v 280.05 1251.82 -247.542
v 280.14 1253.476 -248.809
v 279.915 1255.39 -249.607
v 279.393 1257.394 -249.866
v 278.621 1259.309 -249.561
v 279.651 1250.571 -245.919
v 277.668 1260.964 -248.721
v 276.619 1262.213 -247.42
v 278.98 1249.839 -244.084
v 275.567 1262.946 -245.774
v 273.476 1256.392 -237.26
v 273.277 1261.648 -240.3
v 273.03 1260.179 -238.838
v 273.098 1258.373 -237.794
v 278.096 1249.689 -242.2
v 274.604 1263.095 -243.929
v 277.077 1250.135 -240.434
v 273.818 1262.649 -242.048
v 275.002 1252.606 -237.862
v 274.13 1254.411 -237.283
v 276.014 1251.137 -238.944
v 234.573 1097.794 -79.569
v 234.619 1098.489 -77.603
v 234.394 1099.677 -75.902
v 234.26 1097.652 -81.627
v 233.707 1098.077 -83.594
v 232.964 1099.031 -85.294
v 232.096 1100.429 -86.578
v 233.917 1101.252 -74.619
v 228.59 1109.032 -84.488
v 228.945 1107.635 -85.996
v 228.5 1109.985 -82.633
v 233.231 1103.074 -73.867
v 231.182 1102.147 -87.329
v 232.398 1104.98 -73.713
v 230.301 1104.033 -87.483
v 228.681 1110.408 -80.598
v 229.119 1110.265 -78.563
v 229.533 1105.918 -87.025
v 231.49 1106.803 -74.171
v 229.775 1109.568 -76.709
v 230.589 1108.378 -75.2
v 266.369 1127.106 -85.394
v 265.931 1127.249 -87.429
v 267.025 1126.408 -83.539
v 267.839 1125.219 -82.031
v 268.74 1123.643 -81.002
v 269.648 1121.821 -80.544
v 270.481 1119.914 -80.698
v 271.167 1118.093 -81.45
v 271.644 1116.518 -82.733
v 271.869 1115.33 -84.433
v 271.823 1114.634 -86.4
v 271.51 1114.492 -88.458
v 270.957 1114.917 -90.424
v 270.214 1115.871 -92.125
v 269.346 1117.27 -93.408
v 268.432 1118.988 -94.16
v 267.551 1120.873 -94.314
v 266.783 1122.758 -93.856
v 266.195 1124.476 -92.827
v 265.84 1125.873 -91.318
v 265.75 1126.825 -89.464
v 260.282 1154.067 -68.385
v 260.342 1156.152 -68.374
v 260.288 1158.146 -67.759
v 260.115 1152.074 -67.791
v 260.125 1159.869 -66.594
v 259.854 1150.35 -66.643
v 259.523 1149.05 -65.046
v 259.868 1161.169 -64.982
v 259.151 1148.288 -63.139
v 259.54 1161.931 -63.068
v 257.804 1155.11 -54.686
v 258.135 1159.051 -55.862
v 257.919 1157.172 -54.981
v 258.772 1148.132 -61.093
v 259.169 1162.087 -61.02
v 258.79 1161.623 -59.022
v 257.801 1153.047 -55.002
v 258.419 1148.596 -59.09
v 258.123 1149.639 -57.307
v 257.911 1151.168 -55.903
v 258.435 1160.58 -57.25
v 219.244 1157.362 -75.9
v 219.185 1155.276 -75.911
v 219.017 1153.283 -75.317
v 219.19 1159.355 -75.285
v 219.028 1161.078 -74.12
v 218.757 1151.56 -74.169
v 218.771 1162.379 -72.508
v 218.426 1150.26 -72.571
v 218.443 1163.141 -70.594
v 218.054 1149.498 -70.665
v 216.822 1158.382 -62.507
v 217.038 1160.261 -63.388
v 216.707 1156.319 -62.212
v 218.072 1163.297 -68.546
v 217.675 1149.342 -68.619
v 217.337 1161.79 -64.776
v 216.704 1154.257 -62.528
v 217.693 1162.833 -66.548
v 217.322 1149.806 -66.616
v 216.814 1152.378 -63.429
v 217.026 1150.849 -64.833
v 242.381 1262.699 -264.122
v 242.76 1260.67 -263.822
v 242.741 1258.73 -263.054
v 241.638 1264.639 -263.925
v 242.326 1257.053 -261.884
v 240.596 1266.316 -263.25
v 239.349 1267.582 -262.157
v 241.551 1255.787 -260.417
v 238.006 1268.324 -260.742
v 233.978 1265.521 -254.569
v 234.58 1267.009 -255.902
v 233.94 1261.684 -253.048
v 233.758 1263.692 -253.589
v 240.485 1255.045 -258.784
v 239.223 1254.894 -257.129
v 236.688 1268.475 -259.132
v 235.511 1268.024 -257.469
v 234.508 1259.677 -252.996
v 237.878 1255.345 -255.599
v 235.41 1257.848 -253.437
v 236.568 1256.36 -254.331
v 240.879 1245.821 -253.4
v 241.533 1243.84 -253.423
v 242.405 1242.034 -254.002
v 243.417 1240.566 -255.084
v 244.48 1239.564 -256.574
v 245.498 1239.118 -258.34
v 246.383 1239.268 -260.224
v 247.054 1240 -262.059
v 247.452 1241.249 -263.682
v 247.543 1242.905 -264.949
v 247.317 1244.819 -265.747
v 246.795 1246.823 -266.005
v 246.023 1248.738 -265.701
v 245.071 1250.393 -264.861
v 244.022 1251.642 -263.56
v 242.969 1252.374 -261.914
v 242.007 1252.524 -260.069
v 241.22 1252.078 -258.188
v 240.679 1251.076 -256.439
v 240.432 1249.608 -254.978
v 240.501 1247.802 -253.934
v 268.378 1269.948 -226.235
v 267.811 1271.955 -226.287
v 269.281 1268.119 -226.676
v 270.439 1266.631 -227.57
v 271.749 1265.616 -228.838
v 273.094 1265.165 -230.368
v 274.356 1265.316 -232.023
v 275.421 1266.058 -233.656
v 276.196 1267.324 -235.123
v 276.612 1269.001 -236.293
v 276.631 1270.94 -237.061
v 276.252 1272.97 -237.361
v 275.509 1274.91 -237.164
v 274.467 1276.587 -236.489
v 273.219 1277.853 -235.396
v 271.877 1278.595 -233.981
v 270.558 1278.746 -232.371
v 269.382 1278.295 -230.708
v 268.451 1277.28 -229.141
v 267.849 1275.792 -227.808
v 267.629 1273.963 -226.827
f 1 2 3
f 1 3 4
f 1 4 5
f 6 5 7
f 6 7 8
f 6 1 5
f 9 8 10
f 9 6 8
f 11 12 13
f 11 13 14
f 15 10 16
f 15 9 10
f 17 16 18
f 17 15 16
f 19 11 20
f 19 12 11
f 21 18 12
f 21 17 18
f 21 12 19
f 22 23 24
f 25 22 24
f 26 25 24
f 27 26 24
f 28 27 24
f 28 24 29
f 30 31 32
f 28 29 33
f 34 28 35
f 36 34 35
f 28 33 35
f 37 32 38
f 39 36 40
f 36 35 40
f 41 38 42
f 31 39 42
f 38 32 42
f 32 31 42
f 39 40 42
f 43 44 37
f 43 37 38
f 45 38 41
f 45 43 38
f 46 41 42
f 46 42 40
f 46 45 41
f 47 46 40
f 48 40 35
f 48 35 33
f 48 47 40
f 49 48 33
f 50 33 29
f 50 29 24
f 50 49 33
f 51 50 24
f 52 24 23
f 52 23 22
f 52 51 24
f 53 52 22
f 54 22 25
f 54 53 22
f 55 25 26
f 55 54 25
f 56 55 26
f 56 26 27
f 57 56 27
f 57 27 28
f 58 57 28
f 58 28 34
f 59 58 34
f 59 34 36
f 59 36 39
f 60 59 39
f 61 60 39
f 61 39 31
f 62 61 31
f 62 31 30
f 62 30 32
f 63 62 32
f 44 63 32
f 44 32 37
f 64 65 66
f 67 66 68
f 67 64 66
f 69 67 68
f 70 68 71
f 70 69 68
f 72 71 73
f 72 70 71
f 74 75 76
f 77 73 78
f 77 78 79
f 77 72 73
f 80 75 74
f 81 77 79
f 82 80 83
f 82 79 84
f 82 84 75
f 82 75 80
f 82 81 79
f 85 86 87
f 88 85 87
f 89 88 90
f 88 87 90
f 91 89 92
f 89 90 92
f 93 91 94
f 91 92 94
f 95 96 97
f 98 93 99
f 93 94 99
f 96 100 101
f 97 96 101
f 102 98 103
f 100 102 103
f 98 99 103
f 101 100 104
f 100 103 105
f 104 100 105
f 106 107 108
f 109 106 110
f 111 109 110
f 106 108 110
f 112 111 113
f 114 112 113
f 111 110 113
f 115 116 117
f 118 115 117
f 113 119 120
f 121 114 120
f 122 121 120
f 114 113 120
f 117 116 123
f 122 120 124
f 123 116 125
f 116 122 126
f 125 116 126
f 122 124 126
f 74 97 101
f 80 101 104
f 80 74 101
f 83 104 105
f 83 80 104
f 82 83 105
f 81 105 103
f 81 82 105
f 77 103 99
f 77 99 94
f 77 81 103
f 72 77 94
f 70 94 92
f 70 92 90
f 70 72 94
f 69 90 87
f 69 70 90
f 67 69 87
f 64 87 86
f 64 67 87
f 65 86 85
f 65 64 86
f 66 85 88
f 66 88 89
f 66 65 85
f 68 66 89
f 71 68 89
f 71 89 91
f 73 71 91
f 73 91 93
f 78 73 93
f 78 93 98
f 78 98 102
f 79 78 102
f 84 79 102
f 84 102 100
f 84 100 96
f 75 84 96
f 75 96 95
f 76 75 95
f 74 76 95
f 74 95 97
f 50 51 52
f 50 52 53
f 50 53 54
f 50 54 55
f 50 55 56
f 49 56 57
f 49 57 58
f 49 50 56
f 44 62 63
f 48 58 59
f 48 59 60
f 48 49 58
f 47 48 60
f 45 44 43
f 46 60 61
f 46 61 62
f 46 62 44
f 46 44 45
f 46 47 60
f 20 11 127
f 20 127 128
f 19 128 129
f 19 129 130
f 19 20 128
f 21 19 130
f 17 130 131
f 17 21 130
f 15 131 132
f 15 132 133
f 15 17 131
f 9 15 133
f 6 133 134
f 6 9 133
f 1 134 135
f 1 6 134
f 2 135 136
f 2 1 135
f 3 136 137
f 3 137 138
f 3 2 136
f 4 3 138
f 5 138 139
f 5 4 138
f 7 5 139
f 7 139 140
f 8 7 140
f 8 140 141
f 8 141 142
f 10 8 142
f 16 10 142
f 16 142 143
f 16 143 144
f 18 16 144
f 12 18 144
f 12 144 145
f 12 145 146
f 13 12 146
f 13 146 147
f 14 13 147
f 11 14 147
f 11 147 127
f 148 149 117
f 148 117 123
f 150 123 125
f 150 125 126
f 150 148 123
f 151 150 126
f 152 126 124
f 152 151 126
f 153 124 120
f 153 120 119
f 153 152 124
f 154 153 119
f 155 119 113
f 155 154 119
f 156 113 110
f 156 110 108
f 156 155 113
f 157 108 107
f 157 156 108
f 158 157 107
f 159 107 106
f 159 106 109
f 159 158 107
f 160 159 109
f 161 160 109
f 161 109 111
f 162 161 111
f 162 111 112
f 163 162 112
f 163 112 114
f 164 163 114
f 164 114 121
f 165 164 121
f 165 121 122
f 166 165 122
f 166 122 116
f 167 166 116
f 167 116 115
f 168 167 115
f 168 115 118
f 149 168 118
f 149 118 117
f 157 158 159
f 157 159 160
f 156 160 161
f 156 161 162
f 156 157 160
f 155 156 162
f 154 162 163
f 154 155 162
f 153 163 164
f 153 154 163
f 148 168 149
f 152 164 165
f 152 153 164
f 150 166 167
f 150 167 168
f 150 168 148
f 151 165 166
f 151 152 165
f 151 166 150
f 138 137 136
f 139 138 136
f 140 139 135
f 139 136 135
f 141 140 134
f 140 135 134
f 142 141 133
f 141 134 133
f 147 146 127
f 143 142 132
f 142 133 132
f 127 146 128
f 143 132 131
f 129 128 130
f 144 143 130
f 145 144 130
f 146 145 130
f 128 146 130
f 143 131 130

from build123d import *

# Parameters (mm, degrees)
SUSP_RR_ROCKER_BRACKET_A_PROFILE_R   = 7
SUSP_RR_ROCKER_BRACKET_B_PROFILE_R   = 7
SUSP_RR_COILOVER_BRACKET_A_PROFILE_R = 7
SUSP_RR_COILOVER_BRACKET_B_PROFILE_R = 7


with BuildPart() as part:
    # SUSP_RR_rocker_bracket_a: sweep along a curve in space
    with BuildLine() as susp_rr_rocker_bracket_a_path:
        Line((217.967798, 1156.31916, -69.0971306), (259.065027, 1155.1096, -61.5712018))
    # SUSP_RR_rocker_bracket_a profile (on start of the path) → SUSP_RR_rocker_bracket_a (sweep)
    with BuildSketch(Plane(origin=(217.967798, 1156.31916, -69.0971306), x_dir=(-0.18012957419404588, 0, 0.9836428907386419), z_dir=(0.9832309457336401, -0.028938126770580858, 0.18005413677764104))):
        Circle(SUSP_RR_ROCKER_BRACKET_A_PROFILE_R)
    sweep(path=susp_rr_rocker_bracket_a_path.line)


with BuildPart() as body_2:
    # SUSP_RR_rocker_bracket_b: sweep along a curve in space
    with BuildLine() as susp_rr_rocker_bracket_b_path:
        Line((231.564969, 1104.02989, -80.5982665), (268.814973, 1120.8704, -87.4287982))
    # SUSP_RR_rocker_bracket_b profile (on start of the path) → SUSP_RR_rocker_bracket_b (sweep)
    with BuildSketch(Plane(origin=(231.564969, 1104.02989, -80.5982665), x_dir=(-0.41195094092127316, 0.9112060262498695, 0), z_dir=(0.8987466334179565, 0.4063181219401058, -0.16480313317092873))):
        Circle(SUSP_RR_ROCKER_BRACKET_B_PROFILE_R)
    sweep(path=susp_rr_rocker_bracket_b_path.line)


with BuildPart() as body_3:
    # SUSP_RR_coilover_bracket_a: sweep along a curve in space
    with BuildLine() as susp_rr_coilover_bracket_a_path:
        Line((238.279774, 1261.68448, -258.540964), (272.150503, 1271.95544, -231.779774))
    # SUSP_RR_coilover_bracket_a profile (on start of the path) → SUSP_RR_coilover_bracket_a (sweep)
    with BuildSketch(Plane(origin=(238.279774, 1261.68448, -258.540964), x_dir=(-0.6199459454957336, 0, 0.7846445212090639), z_dir=(0.7633345136071678, 0.2314735610172051, 0.6031089544071807))):
        Circle(SUSP_RR_COILOVER_BRACKET_A_PROFILE_R)
    sweep(path=susp_rr_coilover_bracket_a_path.line)


with BuildPart() as body_4:
    # SUSP_RR_coilover_bracket_b: sweep along a curve in space
    with BuildLine() as susp_rr_coilover_bracket_b_path:
        Line((243.984676, 1245.82104, -259.67307), (276.582297, 1256.39216, -243.533226))
    # SUSP_RR_coilover_bracket_b profile (on start of the path) → SUSP_RR_coilover_bracket_b (sweep)
    with BuildSketch(Plane(origin=(243.984676, 1245.82104, -259.67307), x_dir=(-0.4437139540554131, 0, 0.8961684701977138), z_dir=(0.8605635597184917, 0.2790731463934563, 0.42608513075052806))):
        Circle(SUSP_RR_COILOVER_BRACKET_B_PROFILE_R)
    sweep(path=susp_rr_coilover_bracket_b_path.line)


solid = Compound([part.part, body_2.part, body_3.part, body_4.part])
